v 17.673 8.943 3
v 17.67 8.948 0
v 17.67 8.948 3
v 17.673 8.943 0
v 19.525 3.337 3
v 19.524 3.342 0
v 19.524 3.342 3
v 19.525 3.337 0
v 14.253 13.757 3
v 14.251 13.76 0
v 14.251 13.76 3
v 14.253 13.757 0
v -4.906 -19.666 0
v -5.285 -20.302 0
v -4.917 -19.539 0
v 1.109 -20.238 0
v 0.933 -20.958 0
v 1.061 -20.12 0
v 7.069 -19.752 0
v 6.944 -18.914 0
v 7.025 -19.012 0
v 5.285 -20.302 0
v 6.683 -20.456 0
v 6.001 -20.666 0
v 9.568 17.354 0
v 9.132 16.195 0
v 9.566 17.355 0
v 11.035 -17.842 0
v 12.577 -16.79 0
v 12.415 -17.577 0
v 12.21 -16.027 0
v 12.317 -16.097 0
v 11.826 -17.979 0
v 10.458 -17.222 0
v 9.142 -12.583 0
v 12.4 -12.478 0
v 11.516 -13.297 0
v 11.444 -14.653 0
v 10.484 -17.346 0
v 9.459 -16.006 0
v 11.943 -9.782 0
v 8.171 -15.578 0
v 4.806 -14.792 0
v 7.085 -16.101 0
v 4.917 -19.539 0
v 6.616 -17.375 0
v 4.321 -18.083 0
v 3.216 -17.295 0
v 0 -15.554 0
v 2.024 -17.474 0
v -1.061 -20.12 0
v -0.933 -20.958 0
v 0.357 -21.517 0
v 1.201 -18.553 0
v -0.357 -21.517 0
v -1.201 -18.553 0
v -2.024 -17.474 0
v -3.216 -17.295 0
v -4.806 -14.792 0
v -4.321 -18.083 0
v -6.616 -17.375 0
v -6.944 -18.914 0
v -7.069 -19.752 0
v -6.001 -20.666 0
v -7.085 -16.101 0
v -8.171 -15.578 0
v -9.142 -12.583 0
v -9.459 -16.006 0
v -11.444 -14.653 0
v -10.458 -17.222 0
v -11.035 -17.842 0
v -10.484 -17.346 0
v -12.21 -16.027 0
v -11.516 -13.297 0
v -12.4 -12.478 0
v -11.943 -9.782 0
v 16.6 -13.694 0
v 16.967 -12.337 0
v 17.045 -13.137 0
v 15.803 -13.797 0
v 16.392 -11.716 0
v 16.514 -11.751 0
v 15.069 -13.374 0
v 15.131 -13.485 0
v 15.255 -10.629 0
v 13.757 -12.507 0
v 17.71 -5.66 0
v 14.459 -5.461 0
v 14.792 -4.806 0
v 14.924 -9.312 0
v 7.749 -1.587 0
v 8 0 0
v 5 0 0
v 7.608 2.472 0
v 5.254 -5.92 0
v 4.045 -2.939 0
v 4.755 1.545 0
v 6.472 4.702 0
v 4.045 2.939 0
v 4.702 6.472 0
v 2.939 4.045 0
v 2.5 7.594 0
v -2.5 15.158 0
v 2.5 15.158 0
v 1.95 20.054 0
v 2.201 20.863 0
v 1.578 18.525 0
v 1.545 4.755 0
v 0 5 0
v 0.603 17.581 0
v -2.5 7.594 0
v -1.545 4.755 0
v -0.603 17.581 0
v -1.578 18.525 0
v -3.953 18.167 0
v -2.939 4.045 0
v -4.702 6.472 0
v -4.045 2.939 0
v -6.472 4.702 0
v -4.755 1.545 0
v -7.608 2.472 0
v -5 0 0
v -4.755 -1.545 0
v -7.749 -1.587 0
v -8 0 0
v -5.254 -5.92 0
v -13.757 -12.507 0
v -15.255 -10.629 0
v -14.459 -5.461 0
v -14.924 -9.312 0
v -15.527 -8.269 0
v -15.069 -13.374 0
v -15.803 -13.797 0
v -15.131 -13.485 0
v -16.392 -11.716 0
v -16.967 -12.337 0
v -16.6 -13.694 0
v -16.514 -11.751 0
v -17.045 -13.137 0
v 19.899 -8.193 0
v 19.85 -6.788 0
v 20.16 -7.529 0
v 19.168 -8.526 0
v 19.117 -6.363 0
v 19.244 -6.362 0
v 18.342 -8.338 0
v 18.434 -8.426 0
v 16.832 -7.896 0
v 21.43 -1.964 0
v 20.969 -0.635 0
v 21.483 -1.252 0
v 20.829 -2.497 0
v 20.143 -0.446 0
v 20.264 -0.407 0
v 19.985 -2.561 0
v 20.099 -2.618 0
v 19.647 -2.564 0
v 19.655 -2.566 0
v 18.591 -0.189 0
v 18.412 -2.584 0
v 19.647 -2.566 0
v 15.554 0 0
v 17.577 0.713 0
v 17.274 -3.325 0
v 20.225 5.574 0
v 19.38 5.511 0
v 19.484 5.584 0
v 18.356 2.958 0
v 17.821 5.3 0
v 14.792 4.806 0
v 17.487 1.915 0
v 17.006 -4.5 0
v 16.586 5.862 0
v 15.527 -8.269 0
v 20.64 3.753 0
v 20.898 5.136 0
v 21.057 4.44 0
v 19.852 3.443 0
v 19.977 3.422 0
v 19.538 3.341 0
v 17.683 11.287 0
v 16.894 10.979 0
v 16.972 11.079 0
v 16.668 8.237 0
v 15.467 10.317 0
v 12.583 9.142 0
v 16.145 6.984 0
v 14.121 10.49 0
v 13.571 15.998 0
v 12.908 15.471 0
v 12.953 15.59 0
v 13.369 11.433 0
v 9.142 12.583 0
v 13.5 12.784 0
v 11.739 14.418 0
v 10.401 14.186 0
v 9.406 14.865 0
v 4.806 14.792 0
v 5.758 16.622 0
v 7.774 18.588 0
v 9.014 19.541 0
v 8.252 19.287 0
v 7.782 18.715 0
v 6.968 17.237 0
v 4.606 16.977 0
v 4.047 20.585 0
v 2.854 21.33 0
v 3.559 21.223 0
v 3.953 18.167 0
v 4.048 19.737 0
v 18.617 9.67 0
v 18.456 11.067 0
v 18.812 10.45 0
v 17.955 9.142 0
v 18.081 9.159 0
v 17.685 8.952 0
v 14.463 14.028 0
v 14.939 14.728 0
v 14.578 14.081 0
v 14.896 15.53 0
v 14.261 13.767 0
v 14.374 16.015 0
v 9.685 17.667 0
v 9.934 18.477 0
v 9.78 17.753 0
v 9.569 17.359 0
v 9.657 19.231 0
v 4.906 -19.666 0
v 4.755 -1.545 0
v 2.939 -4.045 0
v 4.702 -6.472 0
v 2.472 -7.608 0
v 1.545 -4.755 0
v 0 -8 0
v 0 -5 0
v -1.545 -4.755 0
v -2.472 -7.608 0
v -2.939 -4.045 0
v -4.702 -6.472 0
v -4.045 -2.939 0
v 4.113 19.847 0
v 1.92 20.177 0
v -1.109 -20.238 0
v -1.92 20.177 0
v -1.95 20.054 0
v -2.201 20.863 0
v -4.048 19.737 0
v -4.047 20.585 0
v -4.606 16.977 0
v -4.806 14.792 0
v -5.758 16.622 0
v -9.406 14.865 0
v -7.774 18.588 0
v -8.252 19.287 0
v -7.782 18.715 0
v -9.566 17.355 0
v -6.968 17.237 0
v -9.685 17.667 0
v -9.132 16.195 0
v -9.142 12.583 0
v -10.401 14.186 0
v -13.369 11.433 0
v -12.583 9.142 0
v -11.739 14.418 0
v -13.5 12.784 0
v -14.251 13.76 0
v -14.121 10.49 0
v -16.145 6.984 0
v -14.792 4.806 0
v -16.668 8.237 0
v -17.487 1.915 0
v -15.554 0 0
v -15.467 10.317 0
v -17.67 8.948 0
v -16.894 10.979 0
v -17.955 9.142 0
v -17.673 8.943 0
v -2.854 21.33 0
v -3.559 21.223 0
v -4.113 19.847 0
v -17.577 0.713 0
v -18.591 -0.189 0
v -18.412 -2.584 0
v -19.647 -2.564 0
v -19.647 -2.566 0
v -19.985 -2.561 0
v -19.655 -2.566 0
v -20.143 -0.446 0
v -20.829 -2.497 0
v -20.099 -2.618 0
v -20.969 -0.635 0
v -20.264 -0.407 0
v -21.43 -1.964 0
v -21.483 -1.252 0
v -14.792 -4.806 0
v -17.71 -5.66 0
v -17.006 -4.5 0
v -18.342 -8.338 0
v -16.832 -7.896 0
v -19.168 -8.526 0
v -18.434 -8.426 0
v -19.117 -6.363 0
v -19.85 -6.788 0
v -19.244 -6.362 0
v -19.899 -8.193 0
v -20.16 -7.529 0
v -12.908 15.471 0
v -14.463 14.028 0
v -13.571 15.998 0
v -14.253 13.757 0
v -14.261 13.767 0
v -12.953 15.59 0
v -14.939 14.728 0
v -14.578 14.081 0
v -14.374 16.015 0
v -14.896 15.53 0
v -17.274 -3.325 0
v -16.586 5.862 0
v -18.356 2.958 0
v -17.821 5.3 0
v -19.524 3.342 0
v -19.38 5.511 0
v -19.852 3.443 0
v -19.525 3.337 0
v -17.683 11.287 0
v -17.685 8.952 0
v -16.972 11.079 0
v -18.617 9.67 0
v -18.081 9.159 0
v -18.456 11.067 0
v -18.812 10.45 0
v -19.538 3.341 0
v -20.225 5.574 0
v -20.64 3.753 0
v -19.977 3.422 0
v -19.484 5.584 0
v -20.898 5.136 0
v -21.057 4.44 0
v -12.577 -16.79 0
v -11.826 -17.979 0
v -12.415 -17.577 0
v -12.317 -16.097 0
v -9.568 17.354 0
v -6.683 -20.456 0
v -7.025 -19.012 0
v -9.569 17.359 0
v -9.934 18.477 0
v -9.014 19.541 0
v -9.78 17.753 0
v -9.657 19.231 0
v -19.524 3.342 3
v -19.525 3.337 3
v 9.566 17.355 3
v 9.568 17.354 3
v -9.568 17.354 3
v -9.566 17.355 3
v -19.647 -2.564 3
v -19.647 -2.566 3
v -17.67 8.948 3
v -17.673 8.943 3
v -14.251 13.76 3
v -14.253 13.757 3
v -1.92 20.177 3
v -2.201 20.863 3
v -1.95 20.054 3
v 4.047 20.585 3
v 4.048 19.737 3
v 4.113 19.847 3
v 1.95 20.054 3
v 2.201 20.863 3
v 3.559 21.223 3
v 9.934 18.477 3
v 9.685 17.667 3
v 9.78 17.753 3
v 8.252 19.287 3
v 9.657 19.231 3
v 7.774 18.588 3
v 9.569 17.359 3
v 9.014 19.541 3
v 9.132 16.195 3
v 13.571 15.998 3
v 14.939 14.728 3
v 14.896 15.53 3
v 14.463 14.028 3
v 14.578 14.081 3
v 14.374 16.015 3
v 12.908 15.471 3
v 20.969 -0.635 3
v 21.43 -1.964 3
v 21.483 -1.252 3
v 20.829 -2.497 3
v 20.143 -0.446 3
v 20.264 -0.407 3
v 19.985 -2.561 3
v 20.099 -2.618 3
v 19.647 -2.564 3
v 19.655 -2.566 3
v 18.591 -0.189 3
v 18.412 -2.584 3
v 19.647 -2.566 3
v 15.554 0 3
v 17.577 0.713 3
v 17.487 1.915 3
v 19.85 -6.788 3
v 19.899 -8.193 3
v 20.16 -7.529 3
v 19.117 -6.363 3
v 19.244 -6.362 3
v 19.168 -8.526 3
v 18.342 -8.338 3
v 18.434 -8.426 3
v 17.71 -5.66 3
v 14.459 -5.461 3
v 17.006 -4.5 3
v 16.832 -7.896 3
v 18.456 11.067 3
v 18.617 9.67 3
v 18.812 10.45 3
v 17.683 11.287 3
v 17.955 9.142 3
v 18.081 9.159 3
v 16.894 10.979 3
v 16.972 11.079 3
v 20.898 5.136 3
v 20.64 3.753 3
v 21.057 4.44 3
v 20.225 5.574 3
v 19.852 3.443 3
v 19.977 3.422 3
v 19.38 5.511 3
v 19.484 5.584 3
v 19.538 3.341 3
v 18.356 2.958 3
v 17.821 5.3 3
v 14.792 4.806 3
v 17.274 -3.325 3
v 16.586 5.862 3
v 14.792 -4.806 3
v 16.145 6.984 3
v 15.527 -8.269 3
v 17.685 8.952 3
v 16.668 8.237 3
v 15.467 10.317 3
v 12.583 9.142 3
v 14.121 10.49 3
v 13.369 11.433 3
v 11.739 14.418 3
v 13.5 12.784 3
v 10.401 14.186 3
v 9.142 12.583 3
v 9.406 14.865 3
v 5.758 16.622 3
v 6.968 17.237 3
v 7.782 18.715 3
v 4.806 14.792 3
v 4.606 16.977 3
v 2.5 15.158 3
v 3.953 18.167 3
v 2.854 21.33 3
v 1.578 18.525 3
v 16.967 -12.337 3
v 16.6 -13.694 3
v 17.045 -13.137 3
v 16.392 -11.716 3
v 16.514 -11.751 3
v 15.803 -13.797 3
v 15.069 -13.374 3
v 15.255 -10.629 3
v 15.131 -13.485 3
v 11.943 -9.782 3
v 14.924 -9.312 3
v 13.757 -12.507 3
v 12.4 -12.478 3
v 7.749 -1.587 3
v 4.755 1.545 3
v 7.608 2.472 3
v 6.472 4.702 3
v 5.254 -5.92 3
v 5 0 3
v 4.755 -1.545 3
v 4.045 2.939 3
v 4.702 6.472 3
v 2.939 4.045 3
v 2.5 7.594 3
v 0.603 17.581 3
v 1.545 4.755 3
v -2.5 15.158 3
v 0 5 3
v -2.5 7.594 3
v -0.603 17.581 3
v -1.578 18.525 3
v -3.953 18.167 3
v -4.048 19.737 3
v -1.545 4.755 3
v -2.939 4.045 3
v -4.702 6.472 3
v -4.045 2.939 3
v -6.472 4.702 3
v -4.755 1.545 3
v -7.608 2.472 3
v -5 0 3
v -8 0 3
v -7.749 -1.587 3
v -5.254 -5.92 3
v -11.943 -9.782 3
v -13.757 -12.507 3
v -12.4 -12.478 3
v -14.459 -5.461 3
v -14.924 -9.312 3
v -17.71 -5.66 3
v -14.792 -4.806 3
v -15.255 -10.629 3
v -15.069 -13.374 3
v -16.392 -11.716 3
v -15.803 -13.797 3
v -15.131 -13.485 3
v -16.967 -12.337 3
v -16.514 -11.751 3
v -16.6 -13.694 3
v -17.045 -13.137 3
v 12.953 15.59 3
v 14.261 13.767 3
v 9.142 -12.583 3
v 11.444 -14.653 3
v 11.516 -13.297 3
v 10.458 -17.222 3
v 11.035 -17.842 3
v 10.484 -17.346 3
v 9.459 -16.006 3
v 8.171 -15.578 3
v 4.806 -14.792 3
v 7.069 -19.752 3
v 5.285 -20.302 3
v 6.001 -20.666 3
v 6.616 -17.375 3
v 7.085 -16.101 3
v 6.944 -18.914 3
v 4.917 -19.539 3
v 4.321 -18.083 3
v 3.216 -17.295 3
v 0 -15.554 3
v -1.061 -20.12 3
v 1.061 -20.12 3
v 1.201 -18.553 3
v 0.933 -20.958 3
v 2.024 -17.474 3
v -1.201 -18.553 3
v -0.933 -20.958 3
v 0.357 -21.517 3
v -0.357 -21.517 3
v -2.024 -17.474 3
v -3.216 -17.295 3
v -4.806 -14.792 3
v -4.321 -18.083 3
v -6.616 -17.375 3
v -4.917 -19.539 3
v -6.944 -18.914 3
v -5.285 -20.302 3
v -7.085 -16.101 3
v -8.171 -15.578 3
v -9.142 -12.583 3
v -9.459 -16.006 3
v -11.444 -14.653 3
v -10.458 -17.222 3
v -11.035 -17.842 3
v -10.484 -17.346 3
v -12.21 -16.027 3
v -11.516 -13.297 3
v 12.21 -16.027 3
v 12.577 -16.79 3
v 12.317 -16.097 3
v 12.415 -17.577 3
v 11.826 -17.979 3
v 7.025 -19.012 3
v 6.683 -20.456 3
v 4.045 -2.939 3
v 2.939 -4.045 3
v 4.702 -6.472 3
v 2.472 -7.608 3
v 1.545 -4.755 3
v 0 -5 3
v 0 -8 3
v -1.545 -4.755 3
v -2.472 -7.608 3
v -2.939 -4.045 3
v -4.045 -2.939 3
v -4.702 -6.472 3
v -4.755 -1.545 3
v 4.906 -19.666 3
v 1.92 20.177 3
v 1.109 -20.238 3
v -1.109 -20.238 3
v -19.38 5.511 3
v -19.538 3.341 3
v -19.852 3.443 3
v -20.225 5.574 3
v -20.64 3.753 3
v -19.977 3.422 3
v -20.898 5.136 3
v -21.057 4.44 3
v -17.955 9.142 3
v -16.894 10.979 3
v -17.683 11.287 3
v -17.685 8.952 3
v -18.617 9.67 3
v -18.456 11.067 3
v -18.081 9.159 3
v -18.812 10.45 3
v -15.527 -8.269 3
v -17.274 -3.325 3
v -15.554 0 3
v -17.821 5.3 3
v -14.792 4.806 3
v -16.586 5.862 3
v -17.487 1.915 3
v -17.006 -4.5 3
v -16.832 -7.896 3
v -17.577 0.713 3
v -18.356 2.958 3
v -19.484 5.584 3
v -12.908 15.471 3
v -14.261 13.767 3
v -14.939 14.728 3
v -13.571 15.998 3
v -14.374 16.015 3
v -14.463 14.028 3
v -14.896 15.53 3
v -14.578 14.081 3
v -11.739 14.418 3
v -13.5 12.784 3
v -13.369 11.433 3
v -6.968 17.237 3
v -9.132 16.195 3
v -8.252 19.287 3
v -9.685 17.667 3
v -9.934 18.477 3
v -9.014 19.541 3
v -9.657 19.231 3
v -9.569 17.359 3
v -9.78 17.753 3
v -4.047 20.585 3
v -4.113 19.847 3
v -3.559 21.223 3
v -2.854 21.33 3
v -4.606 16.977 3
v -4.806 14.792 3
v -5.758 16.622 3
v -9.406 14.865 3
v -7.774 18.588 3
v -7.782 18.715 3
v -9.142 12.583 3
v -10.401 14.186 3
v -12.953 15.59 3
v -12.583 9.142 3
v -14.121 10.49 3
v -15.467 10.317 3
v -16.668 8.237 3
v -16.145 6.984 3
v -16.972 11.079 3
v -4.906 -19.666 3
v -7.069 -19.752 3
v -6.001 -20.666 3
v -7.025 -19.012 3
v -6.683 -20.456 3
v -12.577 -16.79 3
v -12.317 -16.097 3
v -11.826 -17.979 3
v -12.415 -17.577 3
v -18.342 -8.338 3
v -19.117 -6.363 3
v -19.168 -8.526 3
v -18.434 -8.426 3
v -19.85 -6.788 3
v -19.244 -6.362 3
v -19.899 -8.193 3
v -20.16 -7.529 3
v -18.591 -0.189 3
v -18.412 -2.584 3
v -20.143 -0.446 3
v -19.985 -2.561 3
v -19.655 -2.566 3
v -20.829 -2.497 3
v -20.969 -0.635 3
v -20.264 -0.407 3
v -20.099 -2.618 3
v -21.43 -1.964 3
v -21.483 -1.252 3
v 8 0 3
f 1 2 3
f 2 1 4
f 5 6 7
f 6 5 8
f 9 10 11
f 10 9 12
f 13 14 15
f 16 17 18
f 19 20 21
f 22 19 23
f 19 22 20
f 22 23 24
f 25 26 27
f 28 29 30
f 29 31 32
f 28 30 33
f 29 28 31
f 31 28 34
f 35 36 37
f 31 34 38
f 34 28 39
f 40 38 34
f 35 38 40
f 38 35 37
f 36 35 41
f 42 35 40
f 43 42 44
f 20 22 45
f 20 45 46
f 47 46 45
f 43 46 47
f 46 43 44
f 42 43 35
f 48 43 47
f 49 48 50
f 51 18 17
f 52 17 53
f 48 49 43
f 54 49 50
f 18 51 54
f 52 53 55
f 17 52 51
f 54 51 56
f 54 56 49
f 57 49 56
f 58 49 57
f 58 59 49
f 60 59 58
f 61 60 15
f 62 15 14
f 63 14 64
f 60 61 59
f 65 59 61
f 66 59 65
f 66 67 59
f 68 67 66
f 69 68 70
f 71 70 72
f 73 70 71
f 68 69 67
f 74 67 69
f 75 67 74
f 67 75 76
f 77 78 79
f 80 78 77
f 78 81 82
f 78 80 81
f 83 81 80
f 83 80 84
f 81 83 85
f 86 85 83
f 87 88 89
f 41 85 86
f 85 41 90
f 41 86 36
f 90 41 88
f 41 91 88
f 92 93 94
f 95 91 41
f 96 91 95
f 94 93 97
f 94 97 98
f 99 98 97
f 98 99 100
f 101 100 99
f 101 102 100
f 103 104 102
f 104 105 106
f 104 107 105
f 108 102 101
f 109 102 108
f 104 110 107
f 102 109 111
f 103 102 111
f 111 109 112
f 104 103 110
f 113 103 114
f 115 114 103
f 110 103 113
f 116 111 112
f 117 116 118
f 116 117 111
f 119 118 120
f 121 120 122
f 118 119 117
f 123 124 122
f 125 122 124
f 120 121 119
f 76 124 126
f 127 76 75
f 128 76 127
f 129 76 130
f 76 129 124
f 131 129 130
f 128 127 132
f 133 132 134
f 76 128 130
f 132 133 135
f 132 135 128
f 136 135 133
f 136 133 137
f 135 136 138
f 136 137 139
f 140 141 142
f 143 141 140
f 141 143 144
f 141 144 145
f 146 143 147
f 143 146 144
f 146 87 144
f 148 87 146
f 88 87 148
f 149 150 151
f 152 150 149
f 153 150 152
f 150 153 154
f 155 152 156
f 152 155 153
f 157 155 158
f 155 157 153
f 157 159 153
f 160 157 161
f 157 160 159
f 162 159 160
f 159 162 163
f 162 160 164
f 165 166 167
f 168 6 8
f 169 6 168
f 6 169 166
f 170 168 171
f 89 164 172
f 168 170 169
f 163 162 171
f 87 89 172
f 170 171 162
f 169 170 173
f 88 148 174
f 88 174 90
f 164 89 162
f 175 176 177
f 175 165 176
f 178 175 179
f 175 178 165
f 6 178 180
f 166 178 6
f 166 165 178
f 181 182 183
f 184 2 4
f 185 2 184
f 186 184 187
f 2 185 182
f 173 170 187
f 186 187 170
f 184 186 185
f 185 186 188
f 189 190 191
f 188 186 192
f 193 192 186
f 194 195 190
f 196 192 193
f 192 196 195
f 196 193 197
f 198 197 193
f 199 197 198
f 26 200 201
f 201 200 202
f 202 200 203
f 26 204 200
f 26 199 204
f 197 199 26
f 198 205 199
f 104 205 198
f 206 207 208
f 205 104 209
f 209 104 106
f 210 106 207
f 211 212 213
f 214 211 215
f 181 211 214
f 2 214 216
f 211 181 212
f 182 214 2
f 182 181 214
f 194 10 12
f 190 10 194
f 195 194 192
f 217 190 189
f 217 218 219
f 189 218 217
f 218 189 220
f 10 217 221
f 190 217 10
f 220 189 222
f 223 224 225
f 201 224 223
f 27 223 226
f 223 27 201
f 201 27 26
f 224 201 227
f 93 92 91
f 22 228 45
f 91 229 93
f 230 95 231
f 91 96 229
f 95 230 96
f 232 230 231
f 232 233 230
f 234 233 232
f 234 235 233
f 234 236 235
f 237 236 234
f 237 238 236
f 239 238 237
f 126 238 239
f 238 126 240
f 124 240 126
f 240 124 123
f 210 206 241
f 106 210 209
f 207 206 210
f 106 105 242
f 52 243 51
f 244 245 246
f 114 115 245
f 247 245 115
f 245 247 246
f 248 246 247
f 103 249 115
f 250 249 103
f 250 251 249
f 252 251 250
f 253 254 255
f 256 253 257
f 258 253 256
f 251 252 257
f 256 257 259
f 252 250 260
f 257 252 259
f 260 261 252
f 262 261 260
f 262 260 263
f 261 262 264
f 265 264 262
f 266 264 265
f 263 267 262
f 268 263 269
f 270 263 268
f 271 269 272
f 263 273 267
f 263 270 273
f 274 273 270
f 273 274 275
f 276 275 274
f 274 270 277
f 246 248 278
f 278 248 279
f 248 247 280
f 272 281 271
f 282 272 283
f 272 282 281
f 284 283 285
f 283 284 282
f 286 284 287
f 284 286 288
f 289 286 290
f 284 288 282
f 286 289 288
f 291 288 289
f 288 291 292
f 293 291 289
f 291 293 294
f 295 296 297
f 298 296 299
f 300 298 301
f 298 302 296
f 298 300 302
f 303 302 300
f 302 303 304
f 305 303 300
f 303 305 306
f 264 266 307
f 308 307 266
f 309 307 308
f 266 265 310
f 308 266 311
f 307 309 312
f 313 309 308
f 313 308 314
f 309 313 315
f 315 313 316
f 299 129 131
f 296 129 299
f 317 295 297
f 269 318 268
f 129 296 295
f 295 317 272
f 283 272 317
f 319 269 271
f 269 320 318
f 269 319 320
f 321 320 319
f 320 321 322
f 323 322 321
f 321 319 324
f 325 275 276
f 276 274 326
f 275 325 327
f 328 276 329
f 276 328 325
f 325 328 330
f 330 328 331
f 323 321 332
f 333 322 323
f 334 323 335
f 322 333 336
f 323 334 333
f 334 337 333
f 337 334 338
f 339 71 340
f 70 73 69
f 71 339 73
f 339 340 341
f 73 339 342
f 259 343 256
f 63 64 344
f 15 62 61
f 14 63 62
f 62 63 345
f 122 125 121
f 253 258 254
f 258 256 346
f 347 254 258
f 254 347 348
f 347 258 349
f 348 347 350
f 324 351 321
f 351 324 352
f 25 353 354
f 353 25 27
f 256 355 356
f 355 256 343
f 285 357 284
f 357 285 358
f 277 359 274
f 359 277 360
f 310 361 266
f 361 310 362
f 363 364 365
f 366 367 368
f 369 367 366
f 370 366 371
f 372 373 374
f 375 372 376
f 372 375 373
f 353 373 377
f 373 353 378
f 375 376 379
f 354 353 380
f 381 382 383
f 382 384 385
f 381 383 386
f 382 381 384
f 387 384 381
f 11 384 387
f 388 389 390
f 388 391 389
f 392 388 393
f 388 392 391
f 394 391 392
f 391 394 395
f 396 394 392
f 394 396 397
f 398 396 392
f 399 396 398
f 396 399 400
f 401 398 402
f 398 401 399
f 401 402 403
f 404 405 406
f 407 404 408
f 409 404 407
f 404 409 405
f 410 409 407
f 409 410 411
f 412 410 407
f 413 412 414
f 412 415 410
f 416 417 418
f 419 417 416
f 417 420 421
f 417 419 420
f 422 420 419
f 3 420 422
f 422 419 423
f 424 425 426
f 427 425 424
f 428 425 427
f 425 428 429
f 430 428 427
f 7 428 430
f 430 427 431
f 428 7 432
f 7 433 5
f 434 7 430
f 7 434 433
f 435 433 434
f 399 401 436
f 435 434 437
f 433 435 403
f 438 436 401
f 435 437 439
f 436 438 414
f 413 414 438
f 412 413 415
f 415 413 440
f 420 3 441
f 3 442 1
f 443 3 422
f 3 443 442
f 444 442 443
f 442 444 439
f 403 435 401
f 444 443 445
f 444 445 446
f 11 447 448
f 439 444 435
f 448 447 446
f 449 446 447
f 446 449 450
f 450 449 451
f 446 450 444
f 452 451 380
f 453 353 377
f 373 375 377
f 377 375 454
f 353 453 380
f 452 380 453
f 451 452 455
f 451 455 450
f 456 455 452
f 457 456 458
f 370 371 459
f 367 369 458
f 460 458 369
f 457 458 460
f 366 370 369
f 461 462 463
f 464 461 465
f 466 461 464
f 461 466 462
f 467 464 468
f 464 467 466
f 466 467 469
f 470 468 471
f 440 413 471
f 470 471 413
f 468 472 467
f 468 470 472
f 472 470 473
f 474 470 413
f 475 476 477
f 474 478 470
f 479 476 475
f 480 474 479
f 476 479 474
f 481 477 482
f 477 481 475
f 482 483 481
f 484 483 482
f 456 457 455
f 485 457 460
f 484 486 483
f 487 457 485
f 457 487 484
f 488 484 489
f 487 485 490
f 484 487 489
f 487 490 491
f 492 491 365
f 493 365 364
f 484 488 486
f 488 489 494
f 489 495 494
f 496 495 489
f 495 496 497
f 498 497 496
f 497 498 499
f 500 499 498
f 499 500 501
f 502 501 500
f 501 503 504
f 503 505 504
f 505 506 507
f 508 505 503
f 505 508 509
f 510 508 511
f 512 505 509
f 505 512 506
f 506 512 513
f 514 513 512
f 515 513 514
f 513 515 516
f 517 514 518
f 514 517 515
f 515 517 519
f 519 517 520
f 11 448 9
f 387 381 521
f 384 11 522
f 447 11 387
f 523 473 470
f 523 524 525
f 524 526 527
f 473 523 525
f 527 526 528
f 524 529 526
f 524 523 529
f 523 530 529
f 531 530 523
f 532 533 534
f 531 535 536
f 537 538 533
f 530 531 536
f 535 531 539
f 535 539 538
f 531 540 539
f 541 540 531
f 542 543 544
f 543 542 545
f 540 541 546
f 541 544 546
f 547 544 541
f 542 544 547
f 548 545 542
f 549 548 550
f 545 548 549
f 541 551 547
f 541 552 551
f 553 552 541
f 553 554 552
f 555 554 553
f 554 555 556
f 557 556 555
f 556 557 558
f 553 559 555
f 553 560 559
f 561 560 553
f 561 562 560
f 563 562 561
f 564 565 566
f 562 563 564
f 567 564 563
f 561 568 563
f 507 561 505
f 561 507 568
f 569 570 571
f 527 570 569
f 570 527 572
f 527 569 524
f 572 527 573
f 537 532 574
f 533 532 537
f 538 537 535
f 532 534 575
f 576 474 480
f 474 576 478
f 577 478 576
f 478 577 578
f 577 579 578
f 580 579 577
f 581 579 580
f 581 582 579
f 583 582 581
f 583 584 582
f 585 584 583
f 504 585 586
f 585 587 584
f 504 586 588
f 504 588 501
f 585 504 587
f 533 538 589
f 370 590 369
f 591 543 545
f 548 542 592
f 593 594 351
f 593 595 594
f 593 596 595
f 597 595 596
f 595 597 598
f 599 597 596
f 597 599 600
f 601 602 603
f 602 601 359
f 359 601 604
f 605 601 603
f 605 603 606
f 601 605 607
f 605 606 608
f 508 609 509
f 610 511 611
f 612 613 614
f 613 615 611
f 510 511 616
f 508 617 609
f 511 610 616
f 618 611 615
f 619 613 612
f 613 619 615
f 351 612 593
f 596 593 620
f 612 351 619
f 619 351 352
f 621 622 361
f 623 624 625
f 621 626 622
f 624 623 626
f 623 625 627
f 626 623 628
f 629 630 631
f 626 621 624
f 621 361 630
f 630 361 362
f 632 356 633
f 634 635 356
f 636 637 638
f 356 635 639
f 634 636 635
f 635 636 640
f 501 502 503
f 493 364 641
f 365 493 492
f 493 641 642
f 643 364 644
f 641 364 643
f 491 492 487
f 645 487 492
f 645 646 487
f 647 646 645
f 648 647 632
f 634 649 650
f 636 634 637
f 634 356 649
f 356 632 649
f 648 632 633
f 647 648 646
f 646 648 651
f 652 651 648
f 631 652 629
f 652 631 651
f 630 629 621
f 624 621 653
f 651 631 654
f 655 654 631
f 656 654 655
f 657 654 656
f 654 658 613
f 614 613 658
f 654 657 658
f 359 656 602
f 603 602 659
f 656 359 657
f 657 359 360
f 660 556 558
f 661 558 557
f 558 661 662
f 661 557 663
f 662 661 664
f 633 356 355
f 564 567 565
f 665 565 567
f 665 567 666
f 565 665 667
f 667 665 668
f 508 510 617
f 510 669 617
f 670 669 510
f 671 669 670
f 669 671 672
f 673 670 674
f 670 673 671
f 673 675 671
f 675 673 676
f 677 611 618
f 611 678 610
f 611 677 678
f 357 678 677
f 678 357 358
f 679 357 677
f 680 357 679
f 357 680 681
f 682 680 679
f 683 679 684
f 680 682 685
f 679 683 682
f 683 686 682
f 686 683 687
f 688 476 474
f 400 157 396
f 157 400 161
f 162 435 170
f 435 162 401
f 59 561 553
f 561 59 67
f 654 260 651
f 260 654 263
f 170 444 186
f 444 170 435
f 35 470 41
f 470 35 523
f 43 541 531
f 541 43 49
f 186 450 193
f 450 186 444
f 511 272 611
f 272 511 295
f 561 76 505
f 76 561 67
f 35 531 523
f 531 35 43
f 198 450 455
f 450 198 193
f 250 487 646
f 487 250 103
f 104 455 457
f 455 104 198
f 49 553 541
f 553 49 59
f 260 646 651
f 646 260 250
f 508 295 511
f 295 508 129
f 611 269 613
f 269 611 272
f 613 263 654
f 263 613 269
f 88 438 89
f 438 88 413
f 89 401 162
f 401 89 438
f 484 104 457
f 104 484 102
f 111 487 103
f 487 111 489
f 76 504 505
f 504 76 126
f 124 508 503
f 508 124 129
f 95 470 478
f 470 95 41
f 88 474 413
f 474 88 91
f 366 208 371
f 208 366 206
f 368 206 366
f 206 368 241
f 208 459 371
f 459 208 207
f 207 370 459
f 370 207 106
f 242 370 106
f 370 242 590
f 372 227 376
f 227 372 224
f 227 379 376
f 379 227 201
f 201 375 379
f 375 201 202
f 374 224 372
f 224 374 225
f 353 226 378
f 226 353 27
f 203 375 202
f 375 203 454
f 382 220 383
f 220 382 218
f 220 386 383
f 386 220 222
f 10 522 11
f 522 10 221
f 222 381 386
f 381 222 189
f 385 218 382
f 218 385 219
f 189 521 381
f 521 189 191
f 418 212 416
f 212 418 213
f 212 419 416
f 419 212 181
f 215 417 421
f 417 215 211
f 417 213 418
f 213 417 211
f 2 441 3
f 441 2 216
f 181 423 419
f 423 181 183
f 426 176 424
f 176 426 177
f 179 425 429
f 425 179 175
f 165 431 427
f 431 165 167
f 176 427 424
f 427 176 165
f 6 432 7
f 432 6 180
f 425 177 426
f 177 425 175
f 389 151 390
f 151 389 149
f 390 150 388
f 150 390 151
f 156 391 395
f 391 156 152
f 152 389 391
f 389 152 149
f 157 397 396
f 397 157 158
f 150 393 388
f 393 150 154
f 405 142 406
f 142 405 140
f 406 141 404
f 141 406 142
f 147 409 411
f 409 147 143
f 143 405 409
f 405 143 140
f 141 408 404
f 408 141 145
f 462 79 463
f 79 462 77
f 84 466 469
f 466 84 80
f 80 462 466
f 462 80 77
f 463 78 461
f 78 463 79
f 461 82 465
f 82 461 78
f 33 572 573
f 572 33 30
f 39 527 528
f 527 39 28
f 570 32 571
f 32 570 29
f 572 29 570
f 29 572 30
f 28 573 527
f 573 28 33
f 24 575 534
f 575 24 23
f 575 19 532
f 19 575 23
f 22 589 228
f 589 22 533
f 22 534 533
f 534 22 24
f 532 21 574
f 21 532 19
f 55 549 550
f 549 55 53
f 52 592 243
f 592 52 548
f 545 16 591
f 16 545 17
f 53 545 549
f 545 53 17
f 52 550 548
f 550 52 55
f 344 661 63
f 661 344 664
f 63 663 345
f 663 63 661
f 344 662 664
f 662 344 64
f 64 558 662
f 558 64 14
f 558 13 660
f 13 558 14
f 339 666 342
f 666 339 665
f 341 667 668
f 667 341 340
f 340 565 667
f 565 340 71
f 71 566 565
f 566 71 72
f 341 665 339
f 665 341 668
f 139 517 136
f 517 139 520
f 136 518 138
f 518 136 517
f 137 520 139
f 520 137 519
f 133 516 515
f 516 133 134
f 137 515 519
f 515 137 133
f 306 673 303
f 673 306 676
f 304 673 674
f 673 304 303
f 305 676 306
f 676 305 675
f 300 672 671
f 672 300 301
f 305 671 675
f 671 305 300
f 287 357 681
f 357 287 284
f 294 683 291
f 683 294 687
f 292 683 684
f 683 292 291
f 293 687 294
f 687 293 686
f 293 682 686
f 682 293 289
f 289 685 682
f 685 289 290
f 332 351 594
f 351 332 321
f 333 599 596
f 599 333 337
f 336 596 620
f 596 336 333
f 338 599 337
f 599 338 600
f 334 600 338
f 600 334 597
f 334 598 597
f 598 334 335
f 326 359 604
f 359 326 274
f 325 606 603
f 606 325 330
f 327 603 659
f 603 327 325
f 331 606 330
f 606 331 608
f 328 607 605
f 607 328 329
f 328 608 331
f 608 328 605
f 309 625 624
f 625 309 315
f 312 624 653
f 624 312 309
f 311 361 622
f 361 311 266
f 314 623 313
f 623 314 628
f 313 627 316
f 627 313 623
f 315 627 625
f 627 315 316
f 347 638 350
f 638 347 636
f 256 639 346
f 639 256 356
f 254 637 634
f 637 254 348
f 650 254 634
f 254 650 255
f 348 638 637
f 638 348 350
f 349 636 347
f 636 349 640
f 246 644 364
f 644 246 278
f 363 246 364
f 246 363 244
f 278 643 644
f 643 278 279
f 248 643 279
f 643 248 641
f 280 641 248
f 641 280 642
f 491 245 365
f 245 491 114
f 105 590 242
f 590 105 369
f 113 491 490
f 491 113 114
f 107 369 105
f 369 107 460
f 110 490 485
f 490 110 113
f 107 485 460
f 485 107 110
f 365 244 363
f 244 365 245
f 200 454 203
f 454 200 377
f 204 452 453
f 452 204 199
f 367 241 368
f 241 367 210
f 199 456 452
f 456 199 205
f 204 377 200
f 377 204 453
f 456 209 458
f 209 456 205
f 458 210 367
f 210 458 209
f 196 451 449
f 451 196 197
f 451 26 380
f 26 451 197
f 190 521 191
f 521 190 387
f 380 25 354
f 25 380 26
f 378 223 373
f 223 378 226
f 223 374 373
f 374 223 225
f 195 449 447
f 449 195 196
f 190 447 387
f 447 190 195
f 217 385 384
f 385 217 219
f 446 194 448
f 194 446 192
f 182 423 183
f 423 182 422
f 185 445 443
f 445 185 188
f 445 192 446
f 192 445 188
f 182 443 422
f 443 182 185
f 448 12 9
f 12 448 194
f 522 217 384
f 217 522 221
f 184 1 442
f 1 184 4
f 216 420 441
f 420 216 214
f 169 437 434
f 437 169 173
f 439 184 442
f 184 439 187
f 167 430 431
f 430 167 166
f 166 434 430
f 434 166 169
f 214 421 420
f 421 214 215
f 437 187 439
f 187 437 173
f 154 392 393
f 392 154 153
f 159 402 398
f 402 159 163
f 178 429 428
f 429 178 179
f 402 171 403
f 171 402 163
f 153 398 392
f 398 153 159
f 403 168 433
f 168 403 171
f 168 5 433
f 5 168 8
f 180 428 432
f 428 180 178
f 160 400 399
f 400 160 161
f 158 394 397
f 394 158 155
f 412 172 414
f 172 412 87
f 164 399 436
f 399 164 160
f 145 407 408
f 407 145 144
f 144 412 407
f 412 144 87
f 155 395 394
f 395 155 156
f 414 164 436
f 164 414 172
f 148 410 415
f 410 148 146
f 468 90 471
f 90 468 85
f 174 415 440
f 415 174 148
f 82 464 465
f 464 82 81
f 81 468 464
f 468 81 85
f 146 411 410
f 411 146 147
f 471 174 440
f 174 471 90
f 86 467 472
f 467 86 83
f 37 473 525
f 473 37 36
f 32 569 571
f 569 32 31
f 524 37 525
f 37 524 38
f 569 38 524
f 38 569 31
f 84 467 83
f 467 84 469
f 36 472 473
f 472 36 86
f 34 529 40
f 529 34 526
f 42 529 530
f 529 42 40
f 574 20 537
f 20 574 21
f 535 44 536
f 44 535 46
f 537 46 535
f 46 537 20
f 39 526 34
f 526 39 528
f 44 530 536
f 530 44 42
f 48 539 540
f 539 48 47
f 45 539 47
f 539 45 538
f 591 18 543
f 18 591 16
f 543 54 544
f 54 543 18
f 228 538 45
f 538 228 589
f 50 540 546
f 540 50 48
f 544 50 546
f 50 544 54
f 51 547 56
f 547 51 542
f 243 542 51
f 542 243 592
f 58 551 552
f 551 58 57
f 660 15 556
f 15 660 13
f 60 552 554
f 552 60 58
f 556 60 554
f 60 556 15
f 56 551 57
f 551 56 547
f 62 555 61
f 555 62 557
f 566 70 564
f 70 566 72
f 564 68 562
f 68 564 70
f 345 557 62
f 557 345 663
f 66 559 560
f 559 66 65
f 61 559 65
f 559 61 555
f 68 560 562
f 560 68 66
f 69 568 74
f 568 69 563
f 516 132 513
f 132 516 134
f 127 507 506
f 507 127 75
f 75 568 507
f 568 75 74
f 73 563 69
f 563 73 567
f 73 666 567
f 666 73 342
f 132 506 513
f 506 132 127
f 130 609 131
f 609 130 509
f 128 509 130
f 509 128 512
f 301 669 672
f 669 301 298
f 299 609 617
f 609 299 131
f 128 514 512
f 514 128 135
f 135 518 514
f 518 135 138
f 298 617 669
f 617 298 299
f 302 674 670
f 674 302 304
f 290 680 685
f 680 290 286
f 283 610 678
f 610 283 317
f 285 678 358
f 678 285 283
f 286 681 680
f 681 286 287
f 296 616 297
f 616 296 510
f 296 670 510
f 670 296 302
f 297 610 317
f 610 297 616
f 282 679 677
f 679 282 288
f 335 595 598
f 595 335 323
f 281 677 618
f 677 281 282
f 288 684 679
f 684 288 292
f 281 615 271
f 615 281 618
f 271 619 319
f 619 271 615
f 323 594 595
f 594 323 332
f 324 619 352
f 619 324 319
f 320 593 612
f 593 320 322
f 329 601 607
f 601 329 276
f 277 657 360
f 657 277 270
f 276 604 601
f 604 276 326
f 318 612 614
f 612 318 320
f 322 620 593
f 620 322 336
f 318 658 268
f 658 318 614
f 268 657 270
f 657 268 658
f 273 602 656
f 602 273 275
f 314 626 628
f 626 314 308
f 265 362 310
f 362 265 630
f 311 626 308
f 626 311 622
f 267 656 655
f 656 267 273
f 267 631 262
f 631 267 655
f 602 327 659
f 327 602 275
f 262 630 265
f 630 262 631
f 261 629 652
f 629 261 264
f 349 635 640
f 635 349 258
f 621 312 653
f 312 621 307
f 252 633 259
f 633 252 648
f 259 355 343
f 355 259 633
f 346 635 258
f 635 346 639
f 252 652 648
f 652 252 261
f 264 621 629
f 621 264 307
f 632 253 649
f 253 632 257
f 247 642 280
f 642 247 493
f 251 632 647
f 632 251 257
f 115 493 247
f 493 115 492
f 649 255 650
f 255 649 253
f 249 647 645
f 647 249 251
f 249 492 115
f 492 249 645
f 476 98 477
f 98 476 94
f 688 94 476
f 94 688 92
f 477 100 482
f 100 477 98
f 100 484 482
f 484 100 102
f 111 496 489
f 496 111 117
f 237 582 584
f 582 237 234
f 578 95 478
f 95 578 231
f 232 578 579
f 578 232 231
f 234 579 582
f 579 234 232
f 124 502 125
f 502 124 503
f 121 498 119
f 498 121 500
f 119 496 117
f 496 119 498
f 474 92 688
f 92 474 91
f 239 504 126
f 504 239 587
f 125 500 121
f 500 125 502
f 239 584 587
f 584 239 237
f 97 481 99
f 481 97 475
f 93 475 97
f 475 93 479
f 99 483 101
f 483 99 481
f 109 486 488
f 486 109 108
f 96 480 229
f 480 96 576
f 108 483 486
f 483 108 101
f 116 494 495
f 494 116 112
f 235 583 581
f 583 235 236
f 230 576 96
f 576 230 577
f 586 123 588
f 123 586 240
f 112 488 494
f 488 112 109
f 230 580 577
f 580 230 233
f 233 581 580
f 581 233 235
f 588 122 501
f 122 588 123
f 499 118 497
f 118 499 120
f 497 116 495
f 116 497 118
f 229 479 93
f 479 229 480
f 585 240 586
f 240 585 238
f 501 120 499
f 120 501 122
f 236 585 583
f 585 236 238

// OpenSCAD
// distances in mm
tooth_width = 3;
tooth_length = 2;
tooth_shape = 1.3;
desired_gear_radius = 25; // approximate! this is changed to the nearest useful value


hole_radius = 5;
th = 3;
middle_th = 3;
middle_z_offset = -1.5;

outer_wall = 2;
inner_wall = 3;

// spokes: 0-1 = solid, 2+ = spokes
spokes = 8;
spoke_thickness = 5;

// number of segments for cylinder walls
body_res = 20;
tooth_res = 10;

cutout = true;

// modules
module tooth(phi, radius, height, shape=1) {
  translate([radius*sin(phi),radius*cos(phi),0]) {
    rotate([0,0,-phi]) {
      scale([1,tooth_length/tooth_width*2,1]) {
        cylinder(h=height, r=tooth_width*shape/2, $fn=tooth_res, center=true);
      }
    }
  }
}

module gear(desired_gear_radius, th, middle_th, outer_wall, inner_wall, pos, spokes=0) {
  teeth = round(PI*desired_gear_radius/tooth_width);
  gear_radius = teeth * tooth_width / PI;
  echo("Gear Radius determined as: ", gear_radius);
  translate(pos+[0,0,th/2]) {
    difference() {
      union() {
        if (spokes <= 1) {
          // add gear body
          cylinder(h=th, r=gear_radius, $fn=body_res, center=true);
        } else {
          // add gear spokes
          difference() {
            cylinder(h=th, r=gear_radius, $fn=body_res, center=true);
            cylinder(h=th, r=gear_radius-PI*gear_radius/teeth/2-outer_wall, $fn=body_res, center=true);
          }
          for (i = [0:360/spokes:360]) {
            rotate(i) {
              translate([-spoke_thickness/2, hole_radius+inner_wall/2, -th/2]) {
                scale([spoke_thickness, gear_radius - (outer_wall/2) - (hole_radius+inner_wall/2), th]) {
                  cube(1);
                }
              }
            }
          }
        }
        
        // add outer teeth
        for (i = [180/teeth:360/teeth:360]) {
          tooth(i, gear_radius, th, 1/tooth_shape);
        }
      }
      
      // subtract central thickness
      for (i = [1, -1]) {
        translate([0,0,i*th/2+middle_z_offset]) {
          cylinder(r=gear_radius-PI*gear_radius/teeth/2-outer_wall, h=th-middle_th, $fn=body_res, center=true);
        }
      }
      if (cutout) {
        // subtract inner teeth
        for (i = [0:360/teeth:360]) {
          tooth(i, gear_radius, th, tooth_shape);
        }  
      }
      
      // subtract central hole
      cylinder(h=th+1, r=hole_radius, $fn=body_res, center=true);
    }
    difference() {
      // add central wall
      cylinder(h=th, r=hole_radius+inner_wall, $fn=body_res, center=true);
      
      // subtract central hole
      cylinder(h=th+1, r=hole_radius, $fn=body_res, center=true);
    }
  }
}
// gear(radius, max_thickness, min_thickness, outer wall, pos, spokes=0)
gear(20, th, th, 3, 3, [0,0,0], 3);
//gear(11.5, th, th, 3, 3, [0,35,0], 3);
//gear(desired_gear_radius, th, middle_th, outer_wall, inner_wall, [0,0,-th]);
//gear(47.5, th, th, 6, inner_wall, [0,0,-th], spokes);
//gear(10, 4, 4, 4, 4, [0,0,0], 6);
